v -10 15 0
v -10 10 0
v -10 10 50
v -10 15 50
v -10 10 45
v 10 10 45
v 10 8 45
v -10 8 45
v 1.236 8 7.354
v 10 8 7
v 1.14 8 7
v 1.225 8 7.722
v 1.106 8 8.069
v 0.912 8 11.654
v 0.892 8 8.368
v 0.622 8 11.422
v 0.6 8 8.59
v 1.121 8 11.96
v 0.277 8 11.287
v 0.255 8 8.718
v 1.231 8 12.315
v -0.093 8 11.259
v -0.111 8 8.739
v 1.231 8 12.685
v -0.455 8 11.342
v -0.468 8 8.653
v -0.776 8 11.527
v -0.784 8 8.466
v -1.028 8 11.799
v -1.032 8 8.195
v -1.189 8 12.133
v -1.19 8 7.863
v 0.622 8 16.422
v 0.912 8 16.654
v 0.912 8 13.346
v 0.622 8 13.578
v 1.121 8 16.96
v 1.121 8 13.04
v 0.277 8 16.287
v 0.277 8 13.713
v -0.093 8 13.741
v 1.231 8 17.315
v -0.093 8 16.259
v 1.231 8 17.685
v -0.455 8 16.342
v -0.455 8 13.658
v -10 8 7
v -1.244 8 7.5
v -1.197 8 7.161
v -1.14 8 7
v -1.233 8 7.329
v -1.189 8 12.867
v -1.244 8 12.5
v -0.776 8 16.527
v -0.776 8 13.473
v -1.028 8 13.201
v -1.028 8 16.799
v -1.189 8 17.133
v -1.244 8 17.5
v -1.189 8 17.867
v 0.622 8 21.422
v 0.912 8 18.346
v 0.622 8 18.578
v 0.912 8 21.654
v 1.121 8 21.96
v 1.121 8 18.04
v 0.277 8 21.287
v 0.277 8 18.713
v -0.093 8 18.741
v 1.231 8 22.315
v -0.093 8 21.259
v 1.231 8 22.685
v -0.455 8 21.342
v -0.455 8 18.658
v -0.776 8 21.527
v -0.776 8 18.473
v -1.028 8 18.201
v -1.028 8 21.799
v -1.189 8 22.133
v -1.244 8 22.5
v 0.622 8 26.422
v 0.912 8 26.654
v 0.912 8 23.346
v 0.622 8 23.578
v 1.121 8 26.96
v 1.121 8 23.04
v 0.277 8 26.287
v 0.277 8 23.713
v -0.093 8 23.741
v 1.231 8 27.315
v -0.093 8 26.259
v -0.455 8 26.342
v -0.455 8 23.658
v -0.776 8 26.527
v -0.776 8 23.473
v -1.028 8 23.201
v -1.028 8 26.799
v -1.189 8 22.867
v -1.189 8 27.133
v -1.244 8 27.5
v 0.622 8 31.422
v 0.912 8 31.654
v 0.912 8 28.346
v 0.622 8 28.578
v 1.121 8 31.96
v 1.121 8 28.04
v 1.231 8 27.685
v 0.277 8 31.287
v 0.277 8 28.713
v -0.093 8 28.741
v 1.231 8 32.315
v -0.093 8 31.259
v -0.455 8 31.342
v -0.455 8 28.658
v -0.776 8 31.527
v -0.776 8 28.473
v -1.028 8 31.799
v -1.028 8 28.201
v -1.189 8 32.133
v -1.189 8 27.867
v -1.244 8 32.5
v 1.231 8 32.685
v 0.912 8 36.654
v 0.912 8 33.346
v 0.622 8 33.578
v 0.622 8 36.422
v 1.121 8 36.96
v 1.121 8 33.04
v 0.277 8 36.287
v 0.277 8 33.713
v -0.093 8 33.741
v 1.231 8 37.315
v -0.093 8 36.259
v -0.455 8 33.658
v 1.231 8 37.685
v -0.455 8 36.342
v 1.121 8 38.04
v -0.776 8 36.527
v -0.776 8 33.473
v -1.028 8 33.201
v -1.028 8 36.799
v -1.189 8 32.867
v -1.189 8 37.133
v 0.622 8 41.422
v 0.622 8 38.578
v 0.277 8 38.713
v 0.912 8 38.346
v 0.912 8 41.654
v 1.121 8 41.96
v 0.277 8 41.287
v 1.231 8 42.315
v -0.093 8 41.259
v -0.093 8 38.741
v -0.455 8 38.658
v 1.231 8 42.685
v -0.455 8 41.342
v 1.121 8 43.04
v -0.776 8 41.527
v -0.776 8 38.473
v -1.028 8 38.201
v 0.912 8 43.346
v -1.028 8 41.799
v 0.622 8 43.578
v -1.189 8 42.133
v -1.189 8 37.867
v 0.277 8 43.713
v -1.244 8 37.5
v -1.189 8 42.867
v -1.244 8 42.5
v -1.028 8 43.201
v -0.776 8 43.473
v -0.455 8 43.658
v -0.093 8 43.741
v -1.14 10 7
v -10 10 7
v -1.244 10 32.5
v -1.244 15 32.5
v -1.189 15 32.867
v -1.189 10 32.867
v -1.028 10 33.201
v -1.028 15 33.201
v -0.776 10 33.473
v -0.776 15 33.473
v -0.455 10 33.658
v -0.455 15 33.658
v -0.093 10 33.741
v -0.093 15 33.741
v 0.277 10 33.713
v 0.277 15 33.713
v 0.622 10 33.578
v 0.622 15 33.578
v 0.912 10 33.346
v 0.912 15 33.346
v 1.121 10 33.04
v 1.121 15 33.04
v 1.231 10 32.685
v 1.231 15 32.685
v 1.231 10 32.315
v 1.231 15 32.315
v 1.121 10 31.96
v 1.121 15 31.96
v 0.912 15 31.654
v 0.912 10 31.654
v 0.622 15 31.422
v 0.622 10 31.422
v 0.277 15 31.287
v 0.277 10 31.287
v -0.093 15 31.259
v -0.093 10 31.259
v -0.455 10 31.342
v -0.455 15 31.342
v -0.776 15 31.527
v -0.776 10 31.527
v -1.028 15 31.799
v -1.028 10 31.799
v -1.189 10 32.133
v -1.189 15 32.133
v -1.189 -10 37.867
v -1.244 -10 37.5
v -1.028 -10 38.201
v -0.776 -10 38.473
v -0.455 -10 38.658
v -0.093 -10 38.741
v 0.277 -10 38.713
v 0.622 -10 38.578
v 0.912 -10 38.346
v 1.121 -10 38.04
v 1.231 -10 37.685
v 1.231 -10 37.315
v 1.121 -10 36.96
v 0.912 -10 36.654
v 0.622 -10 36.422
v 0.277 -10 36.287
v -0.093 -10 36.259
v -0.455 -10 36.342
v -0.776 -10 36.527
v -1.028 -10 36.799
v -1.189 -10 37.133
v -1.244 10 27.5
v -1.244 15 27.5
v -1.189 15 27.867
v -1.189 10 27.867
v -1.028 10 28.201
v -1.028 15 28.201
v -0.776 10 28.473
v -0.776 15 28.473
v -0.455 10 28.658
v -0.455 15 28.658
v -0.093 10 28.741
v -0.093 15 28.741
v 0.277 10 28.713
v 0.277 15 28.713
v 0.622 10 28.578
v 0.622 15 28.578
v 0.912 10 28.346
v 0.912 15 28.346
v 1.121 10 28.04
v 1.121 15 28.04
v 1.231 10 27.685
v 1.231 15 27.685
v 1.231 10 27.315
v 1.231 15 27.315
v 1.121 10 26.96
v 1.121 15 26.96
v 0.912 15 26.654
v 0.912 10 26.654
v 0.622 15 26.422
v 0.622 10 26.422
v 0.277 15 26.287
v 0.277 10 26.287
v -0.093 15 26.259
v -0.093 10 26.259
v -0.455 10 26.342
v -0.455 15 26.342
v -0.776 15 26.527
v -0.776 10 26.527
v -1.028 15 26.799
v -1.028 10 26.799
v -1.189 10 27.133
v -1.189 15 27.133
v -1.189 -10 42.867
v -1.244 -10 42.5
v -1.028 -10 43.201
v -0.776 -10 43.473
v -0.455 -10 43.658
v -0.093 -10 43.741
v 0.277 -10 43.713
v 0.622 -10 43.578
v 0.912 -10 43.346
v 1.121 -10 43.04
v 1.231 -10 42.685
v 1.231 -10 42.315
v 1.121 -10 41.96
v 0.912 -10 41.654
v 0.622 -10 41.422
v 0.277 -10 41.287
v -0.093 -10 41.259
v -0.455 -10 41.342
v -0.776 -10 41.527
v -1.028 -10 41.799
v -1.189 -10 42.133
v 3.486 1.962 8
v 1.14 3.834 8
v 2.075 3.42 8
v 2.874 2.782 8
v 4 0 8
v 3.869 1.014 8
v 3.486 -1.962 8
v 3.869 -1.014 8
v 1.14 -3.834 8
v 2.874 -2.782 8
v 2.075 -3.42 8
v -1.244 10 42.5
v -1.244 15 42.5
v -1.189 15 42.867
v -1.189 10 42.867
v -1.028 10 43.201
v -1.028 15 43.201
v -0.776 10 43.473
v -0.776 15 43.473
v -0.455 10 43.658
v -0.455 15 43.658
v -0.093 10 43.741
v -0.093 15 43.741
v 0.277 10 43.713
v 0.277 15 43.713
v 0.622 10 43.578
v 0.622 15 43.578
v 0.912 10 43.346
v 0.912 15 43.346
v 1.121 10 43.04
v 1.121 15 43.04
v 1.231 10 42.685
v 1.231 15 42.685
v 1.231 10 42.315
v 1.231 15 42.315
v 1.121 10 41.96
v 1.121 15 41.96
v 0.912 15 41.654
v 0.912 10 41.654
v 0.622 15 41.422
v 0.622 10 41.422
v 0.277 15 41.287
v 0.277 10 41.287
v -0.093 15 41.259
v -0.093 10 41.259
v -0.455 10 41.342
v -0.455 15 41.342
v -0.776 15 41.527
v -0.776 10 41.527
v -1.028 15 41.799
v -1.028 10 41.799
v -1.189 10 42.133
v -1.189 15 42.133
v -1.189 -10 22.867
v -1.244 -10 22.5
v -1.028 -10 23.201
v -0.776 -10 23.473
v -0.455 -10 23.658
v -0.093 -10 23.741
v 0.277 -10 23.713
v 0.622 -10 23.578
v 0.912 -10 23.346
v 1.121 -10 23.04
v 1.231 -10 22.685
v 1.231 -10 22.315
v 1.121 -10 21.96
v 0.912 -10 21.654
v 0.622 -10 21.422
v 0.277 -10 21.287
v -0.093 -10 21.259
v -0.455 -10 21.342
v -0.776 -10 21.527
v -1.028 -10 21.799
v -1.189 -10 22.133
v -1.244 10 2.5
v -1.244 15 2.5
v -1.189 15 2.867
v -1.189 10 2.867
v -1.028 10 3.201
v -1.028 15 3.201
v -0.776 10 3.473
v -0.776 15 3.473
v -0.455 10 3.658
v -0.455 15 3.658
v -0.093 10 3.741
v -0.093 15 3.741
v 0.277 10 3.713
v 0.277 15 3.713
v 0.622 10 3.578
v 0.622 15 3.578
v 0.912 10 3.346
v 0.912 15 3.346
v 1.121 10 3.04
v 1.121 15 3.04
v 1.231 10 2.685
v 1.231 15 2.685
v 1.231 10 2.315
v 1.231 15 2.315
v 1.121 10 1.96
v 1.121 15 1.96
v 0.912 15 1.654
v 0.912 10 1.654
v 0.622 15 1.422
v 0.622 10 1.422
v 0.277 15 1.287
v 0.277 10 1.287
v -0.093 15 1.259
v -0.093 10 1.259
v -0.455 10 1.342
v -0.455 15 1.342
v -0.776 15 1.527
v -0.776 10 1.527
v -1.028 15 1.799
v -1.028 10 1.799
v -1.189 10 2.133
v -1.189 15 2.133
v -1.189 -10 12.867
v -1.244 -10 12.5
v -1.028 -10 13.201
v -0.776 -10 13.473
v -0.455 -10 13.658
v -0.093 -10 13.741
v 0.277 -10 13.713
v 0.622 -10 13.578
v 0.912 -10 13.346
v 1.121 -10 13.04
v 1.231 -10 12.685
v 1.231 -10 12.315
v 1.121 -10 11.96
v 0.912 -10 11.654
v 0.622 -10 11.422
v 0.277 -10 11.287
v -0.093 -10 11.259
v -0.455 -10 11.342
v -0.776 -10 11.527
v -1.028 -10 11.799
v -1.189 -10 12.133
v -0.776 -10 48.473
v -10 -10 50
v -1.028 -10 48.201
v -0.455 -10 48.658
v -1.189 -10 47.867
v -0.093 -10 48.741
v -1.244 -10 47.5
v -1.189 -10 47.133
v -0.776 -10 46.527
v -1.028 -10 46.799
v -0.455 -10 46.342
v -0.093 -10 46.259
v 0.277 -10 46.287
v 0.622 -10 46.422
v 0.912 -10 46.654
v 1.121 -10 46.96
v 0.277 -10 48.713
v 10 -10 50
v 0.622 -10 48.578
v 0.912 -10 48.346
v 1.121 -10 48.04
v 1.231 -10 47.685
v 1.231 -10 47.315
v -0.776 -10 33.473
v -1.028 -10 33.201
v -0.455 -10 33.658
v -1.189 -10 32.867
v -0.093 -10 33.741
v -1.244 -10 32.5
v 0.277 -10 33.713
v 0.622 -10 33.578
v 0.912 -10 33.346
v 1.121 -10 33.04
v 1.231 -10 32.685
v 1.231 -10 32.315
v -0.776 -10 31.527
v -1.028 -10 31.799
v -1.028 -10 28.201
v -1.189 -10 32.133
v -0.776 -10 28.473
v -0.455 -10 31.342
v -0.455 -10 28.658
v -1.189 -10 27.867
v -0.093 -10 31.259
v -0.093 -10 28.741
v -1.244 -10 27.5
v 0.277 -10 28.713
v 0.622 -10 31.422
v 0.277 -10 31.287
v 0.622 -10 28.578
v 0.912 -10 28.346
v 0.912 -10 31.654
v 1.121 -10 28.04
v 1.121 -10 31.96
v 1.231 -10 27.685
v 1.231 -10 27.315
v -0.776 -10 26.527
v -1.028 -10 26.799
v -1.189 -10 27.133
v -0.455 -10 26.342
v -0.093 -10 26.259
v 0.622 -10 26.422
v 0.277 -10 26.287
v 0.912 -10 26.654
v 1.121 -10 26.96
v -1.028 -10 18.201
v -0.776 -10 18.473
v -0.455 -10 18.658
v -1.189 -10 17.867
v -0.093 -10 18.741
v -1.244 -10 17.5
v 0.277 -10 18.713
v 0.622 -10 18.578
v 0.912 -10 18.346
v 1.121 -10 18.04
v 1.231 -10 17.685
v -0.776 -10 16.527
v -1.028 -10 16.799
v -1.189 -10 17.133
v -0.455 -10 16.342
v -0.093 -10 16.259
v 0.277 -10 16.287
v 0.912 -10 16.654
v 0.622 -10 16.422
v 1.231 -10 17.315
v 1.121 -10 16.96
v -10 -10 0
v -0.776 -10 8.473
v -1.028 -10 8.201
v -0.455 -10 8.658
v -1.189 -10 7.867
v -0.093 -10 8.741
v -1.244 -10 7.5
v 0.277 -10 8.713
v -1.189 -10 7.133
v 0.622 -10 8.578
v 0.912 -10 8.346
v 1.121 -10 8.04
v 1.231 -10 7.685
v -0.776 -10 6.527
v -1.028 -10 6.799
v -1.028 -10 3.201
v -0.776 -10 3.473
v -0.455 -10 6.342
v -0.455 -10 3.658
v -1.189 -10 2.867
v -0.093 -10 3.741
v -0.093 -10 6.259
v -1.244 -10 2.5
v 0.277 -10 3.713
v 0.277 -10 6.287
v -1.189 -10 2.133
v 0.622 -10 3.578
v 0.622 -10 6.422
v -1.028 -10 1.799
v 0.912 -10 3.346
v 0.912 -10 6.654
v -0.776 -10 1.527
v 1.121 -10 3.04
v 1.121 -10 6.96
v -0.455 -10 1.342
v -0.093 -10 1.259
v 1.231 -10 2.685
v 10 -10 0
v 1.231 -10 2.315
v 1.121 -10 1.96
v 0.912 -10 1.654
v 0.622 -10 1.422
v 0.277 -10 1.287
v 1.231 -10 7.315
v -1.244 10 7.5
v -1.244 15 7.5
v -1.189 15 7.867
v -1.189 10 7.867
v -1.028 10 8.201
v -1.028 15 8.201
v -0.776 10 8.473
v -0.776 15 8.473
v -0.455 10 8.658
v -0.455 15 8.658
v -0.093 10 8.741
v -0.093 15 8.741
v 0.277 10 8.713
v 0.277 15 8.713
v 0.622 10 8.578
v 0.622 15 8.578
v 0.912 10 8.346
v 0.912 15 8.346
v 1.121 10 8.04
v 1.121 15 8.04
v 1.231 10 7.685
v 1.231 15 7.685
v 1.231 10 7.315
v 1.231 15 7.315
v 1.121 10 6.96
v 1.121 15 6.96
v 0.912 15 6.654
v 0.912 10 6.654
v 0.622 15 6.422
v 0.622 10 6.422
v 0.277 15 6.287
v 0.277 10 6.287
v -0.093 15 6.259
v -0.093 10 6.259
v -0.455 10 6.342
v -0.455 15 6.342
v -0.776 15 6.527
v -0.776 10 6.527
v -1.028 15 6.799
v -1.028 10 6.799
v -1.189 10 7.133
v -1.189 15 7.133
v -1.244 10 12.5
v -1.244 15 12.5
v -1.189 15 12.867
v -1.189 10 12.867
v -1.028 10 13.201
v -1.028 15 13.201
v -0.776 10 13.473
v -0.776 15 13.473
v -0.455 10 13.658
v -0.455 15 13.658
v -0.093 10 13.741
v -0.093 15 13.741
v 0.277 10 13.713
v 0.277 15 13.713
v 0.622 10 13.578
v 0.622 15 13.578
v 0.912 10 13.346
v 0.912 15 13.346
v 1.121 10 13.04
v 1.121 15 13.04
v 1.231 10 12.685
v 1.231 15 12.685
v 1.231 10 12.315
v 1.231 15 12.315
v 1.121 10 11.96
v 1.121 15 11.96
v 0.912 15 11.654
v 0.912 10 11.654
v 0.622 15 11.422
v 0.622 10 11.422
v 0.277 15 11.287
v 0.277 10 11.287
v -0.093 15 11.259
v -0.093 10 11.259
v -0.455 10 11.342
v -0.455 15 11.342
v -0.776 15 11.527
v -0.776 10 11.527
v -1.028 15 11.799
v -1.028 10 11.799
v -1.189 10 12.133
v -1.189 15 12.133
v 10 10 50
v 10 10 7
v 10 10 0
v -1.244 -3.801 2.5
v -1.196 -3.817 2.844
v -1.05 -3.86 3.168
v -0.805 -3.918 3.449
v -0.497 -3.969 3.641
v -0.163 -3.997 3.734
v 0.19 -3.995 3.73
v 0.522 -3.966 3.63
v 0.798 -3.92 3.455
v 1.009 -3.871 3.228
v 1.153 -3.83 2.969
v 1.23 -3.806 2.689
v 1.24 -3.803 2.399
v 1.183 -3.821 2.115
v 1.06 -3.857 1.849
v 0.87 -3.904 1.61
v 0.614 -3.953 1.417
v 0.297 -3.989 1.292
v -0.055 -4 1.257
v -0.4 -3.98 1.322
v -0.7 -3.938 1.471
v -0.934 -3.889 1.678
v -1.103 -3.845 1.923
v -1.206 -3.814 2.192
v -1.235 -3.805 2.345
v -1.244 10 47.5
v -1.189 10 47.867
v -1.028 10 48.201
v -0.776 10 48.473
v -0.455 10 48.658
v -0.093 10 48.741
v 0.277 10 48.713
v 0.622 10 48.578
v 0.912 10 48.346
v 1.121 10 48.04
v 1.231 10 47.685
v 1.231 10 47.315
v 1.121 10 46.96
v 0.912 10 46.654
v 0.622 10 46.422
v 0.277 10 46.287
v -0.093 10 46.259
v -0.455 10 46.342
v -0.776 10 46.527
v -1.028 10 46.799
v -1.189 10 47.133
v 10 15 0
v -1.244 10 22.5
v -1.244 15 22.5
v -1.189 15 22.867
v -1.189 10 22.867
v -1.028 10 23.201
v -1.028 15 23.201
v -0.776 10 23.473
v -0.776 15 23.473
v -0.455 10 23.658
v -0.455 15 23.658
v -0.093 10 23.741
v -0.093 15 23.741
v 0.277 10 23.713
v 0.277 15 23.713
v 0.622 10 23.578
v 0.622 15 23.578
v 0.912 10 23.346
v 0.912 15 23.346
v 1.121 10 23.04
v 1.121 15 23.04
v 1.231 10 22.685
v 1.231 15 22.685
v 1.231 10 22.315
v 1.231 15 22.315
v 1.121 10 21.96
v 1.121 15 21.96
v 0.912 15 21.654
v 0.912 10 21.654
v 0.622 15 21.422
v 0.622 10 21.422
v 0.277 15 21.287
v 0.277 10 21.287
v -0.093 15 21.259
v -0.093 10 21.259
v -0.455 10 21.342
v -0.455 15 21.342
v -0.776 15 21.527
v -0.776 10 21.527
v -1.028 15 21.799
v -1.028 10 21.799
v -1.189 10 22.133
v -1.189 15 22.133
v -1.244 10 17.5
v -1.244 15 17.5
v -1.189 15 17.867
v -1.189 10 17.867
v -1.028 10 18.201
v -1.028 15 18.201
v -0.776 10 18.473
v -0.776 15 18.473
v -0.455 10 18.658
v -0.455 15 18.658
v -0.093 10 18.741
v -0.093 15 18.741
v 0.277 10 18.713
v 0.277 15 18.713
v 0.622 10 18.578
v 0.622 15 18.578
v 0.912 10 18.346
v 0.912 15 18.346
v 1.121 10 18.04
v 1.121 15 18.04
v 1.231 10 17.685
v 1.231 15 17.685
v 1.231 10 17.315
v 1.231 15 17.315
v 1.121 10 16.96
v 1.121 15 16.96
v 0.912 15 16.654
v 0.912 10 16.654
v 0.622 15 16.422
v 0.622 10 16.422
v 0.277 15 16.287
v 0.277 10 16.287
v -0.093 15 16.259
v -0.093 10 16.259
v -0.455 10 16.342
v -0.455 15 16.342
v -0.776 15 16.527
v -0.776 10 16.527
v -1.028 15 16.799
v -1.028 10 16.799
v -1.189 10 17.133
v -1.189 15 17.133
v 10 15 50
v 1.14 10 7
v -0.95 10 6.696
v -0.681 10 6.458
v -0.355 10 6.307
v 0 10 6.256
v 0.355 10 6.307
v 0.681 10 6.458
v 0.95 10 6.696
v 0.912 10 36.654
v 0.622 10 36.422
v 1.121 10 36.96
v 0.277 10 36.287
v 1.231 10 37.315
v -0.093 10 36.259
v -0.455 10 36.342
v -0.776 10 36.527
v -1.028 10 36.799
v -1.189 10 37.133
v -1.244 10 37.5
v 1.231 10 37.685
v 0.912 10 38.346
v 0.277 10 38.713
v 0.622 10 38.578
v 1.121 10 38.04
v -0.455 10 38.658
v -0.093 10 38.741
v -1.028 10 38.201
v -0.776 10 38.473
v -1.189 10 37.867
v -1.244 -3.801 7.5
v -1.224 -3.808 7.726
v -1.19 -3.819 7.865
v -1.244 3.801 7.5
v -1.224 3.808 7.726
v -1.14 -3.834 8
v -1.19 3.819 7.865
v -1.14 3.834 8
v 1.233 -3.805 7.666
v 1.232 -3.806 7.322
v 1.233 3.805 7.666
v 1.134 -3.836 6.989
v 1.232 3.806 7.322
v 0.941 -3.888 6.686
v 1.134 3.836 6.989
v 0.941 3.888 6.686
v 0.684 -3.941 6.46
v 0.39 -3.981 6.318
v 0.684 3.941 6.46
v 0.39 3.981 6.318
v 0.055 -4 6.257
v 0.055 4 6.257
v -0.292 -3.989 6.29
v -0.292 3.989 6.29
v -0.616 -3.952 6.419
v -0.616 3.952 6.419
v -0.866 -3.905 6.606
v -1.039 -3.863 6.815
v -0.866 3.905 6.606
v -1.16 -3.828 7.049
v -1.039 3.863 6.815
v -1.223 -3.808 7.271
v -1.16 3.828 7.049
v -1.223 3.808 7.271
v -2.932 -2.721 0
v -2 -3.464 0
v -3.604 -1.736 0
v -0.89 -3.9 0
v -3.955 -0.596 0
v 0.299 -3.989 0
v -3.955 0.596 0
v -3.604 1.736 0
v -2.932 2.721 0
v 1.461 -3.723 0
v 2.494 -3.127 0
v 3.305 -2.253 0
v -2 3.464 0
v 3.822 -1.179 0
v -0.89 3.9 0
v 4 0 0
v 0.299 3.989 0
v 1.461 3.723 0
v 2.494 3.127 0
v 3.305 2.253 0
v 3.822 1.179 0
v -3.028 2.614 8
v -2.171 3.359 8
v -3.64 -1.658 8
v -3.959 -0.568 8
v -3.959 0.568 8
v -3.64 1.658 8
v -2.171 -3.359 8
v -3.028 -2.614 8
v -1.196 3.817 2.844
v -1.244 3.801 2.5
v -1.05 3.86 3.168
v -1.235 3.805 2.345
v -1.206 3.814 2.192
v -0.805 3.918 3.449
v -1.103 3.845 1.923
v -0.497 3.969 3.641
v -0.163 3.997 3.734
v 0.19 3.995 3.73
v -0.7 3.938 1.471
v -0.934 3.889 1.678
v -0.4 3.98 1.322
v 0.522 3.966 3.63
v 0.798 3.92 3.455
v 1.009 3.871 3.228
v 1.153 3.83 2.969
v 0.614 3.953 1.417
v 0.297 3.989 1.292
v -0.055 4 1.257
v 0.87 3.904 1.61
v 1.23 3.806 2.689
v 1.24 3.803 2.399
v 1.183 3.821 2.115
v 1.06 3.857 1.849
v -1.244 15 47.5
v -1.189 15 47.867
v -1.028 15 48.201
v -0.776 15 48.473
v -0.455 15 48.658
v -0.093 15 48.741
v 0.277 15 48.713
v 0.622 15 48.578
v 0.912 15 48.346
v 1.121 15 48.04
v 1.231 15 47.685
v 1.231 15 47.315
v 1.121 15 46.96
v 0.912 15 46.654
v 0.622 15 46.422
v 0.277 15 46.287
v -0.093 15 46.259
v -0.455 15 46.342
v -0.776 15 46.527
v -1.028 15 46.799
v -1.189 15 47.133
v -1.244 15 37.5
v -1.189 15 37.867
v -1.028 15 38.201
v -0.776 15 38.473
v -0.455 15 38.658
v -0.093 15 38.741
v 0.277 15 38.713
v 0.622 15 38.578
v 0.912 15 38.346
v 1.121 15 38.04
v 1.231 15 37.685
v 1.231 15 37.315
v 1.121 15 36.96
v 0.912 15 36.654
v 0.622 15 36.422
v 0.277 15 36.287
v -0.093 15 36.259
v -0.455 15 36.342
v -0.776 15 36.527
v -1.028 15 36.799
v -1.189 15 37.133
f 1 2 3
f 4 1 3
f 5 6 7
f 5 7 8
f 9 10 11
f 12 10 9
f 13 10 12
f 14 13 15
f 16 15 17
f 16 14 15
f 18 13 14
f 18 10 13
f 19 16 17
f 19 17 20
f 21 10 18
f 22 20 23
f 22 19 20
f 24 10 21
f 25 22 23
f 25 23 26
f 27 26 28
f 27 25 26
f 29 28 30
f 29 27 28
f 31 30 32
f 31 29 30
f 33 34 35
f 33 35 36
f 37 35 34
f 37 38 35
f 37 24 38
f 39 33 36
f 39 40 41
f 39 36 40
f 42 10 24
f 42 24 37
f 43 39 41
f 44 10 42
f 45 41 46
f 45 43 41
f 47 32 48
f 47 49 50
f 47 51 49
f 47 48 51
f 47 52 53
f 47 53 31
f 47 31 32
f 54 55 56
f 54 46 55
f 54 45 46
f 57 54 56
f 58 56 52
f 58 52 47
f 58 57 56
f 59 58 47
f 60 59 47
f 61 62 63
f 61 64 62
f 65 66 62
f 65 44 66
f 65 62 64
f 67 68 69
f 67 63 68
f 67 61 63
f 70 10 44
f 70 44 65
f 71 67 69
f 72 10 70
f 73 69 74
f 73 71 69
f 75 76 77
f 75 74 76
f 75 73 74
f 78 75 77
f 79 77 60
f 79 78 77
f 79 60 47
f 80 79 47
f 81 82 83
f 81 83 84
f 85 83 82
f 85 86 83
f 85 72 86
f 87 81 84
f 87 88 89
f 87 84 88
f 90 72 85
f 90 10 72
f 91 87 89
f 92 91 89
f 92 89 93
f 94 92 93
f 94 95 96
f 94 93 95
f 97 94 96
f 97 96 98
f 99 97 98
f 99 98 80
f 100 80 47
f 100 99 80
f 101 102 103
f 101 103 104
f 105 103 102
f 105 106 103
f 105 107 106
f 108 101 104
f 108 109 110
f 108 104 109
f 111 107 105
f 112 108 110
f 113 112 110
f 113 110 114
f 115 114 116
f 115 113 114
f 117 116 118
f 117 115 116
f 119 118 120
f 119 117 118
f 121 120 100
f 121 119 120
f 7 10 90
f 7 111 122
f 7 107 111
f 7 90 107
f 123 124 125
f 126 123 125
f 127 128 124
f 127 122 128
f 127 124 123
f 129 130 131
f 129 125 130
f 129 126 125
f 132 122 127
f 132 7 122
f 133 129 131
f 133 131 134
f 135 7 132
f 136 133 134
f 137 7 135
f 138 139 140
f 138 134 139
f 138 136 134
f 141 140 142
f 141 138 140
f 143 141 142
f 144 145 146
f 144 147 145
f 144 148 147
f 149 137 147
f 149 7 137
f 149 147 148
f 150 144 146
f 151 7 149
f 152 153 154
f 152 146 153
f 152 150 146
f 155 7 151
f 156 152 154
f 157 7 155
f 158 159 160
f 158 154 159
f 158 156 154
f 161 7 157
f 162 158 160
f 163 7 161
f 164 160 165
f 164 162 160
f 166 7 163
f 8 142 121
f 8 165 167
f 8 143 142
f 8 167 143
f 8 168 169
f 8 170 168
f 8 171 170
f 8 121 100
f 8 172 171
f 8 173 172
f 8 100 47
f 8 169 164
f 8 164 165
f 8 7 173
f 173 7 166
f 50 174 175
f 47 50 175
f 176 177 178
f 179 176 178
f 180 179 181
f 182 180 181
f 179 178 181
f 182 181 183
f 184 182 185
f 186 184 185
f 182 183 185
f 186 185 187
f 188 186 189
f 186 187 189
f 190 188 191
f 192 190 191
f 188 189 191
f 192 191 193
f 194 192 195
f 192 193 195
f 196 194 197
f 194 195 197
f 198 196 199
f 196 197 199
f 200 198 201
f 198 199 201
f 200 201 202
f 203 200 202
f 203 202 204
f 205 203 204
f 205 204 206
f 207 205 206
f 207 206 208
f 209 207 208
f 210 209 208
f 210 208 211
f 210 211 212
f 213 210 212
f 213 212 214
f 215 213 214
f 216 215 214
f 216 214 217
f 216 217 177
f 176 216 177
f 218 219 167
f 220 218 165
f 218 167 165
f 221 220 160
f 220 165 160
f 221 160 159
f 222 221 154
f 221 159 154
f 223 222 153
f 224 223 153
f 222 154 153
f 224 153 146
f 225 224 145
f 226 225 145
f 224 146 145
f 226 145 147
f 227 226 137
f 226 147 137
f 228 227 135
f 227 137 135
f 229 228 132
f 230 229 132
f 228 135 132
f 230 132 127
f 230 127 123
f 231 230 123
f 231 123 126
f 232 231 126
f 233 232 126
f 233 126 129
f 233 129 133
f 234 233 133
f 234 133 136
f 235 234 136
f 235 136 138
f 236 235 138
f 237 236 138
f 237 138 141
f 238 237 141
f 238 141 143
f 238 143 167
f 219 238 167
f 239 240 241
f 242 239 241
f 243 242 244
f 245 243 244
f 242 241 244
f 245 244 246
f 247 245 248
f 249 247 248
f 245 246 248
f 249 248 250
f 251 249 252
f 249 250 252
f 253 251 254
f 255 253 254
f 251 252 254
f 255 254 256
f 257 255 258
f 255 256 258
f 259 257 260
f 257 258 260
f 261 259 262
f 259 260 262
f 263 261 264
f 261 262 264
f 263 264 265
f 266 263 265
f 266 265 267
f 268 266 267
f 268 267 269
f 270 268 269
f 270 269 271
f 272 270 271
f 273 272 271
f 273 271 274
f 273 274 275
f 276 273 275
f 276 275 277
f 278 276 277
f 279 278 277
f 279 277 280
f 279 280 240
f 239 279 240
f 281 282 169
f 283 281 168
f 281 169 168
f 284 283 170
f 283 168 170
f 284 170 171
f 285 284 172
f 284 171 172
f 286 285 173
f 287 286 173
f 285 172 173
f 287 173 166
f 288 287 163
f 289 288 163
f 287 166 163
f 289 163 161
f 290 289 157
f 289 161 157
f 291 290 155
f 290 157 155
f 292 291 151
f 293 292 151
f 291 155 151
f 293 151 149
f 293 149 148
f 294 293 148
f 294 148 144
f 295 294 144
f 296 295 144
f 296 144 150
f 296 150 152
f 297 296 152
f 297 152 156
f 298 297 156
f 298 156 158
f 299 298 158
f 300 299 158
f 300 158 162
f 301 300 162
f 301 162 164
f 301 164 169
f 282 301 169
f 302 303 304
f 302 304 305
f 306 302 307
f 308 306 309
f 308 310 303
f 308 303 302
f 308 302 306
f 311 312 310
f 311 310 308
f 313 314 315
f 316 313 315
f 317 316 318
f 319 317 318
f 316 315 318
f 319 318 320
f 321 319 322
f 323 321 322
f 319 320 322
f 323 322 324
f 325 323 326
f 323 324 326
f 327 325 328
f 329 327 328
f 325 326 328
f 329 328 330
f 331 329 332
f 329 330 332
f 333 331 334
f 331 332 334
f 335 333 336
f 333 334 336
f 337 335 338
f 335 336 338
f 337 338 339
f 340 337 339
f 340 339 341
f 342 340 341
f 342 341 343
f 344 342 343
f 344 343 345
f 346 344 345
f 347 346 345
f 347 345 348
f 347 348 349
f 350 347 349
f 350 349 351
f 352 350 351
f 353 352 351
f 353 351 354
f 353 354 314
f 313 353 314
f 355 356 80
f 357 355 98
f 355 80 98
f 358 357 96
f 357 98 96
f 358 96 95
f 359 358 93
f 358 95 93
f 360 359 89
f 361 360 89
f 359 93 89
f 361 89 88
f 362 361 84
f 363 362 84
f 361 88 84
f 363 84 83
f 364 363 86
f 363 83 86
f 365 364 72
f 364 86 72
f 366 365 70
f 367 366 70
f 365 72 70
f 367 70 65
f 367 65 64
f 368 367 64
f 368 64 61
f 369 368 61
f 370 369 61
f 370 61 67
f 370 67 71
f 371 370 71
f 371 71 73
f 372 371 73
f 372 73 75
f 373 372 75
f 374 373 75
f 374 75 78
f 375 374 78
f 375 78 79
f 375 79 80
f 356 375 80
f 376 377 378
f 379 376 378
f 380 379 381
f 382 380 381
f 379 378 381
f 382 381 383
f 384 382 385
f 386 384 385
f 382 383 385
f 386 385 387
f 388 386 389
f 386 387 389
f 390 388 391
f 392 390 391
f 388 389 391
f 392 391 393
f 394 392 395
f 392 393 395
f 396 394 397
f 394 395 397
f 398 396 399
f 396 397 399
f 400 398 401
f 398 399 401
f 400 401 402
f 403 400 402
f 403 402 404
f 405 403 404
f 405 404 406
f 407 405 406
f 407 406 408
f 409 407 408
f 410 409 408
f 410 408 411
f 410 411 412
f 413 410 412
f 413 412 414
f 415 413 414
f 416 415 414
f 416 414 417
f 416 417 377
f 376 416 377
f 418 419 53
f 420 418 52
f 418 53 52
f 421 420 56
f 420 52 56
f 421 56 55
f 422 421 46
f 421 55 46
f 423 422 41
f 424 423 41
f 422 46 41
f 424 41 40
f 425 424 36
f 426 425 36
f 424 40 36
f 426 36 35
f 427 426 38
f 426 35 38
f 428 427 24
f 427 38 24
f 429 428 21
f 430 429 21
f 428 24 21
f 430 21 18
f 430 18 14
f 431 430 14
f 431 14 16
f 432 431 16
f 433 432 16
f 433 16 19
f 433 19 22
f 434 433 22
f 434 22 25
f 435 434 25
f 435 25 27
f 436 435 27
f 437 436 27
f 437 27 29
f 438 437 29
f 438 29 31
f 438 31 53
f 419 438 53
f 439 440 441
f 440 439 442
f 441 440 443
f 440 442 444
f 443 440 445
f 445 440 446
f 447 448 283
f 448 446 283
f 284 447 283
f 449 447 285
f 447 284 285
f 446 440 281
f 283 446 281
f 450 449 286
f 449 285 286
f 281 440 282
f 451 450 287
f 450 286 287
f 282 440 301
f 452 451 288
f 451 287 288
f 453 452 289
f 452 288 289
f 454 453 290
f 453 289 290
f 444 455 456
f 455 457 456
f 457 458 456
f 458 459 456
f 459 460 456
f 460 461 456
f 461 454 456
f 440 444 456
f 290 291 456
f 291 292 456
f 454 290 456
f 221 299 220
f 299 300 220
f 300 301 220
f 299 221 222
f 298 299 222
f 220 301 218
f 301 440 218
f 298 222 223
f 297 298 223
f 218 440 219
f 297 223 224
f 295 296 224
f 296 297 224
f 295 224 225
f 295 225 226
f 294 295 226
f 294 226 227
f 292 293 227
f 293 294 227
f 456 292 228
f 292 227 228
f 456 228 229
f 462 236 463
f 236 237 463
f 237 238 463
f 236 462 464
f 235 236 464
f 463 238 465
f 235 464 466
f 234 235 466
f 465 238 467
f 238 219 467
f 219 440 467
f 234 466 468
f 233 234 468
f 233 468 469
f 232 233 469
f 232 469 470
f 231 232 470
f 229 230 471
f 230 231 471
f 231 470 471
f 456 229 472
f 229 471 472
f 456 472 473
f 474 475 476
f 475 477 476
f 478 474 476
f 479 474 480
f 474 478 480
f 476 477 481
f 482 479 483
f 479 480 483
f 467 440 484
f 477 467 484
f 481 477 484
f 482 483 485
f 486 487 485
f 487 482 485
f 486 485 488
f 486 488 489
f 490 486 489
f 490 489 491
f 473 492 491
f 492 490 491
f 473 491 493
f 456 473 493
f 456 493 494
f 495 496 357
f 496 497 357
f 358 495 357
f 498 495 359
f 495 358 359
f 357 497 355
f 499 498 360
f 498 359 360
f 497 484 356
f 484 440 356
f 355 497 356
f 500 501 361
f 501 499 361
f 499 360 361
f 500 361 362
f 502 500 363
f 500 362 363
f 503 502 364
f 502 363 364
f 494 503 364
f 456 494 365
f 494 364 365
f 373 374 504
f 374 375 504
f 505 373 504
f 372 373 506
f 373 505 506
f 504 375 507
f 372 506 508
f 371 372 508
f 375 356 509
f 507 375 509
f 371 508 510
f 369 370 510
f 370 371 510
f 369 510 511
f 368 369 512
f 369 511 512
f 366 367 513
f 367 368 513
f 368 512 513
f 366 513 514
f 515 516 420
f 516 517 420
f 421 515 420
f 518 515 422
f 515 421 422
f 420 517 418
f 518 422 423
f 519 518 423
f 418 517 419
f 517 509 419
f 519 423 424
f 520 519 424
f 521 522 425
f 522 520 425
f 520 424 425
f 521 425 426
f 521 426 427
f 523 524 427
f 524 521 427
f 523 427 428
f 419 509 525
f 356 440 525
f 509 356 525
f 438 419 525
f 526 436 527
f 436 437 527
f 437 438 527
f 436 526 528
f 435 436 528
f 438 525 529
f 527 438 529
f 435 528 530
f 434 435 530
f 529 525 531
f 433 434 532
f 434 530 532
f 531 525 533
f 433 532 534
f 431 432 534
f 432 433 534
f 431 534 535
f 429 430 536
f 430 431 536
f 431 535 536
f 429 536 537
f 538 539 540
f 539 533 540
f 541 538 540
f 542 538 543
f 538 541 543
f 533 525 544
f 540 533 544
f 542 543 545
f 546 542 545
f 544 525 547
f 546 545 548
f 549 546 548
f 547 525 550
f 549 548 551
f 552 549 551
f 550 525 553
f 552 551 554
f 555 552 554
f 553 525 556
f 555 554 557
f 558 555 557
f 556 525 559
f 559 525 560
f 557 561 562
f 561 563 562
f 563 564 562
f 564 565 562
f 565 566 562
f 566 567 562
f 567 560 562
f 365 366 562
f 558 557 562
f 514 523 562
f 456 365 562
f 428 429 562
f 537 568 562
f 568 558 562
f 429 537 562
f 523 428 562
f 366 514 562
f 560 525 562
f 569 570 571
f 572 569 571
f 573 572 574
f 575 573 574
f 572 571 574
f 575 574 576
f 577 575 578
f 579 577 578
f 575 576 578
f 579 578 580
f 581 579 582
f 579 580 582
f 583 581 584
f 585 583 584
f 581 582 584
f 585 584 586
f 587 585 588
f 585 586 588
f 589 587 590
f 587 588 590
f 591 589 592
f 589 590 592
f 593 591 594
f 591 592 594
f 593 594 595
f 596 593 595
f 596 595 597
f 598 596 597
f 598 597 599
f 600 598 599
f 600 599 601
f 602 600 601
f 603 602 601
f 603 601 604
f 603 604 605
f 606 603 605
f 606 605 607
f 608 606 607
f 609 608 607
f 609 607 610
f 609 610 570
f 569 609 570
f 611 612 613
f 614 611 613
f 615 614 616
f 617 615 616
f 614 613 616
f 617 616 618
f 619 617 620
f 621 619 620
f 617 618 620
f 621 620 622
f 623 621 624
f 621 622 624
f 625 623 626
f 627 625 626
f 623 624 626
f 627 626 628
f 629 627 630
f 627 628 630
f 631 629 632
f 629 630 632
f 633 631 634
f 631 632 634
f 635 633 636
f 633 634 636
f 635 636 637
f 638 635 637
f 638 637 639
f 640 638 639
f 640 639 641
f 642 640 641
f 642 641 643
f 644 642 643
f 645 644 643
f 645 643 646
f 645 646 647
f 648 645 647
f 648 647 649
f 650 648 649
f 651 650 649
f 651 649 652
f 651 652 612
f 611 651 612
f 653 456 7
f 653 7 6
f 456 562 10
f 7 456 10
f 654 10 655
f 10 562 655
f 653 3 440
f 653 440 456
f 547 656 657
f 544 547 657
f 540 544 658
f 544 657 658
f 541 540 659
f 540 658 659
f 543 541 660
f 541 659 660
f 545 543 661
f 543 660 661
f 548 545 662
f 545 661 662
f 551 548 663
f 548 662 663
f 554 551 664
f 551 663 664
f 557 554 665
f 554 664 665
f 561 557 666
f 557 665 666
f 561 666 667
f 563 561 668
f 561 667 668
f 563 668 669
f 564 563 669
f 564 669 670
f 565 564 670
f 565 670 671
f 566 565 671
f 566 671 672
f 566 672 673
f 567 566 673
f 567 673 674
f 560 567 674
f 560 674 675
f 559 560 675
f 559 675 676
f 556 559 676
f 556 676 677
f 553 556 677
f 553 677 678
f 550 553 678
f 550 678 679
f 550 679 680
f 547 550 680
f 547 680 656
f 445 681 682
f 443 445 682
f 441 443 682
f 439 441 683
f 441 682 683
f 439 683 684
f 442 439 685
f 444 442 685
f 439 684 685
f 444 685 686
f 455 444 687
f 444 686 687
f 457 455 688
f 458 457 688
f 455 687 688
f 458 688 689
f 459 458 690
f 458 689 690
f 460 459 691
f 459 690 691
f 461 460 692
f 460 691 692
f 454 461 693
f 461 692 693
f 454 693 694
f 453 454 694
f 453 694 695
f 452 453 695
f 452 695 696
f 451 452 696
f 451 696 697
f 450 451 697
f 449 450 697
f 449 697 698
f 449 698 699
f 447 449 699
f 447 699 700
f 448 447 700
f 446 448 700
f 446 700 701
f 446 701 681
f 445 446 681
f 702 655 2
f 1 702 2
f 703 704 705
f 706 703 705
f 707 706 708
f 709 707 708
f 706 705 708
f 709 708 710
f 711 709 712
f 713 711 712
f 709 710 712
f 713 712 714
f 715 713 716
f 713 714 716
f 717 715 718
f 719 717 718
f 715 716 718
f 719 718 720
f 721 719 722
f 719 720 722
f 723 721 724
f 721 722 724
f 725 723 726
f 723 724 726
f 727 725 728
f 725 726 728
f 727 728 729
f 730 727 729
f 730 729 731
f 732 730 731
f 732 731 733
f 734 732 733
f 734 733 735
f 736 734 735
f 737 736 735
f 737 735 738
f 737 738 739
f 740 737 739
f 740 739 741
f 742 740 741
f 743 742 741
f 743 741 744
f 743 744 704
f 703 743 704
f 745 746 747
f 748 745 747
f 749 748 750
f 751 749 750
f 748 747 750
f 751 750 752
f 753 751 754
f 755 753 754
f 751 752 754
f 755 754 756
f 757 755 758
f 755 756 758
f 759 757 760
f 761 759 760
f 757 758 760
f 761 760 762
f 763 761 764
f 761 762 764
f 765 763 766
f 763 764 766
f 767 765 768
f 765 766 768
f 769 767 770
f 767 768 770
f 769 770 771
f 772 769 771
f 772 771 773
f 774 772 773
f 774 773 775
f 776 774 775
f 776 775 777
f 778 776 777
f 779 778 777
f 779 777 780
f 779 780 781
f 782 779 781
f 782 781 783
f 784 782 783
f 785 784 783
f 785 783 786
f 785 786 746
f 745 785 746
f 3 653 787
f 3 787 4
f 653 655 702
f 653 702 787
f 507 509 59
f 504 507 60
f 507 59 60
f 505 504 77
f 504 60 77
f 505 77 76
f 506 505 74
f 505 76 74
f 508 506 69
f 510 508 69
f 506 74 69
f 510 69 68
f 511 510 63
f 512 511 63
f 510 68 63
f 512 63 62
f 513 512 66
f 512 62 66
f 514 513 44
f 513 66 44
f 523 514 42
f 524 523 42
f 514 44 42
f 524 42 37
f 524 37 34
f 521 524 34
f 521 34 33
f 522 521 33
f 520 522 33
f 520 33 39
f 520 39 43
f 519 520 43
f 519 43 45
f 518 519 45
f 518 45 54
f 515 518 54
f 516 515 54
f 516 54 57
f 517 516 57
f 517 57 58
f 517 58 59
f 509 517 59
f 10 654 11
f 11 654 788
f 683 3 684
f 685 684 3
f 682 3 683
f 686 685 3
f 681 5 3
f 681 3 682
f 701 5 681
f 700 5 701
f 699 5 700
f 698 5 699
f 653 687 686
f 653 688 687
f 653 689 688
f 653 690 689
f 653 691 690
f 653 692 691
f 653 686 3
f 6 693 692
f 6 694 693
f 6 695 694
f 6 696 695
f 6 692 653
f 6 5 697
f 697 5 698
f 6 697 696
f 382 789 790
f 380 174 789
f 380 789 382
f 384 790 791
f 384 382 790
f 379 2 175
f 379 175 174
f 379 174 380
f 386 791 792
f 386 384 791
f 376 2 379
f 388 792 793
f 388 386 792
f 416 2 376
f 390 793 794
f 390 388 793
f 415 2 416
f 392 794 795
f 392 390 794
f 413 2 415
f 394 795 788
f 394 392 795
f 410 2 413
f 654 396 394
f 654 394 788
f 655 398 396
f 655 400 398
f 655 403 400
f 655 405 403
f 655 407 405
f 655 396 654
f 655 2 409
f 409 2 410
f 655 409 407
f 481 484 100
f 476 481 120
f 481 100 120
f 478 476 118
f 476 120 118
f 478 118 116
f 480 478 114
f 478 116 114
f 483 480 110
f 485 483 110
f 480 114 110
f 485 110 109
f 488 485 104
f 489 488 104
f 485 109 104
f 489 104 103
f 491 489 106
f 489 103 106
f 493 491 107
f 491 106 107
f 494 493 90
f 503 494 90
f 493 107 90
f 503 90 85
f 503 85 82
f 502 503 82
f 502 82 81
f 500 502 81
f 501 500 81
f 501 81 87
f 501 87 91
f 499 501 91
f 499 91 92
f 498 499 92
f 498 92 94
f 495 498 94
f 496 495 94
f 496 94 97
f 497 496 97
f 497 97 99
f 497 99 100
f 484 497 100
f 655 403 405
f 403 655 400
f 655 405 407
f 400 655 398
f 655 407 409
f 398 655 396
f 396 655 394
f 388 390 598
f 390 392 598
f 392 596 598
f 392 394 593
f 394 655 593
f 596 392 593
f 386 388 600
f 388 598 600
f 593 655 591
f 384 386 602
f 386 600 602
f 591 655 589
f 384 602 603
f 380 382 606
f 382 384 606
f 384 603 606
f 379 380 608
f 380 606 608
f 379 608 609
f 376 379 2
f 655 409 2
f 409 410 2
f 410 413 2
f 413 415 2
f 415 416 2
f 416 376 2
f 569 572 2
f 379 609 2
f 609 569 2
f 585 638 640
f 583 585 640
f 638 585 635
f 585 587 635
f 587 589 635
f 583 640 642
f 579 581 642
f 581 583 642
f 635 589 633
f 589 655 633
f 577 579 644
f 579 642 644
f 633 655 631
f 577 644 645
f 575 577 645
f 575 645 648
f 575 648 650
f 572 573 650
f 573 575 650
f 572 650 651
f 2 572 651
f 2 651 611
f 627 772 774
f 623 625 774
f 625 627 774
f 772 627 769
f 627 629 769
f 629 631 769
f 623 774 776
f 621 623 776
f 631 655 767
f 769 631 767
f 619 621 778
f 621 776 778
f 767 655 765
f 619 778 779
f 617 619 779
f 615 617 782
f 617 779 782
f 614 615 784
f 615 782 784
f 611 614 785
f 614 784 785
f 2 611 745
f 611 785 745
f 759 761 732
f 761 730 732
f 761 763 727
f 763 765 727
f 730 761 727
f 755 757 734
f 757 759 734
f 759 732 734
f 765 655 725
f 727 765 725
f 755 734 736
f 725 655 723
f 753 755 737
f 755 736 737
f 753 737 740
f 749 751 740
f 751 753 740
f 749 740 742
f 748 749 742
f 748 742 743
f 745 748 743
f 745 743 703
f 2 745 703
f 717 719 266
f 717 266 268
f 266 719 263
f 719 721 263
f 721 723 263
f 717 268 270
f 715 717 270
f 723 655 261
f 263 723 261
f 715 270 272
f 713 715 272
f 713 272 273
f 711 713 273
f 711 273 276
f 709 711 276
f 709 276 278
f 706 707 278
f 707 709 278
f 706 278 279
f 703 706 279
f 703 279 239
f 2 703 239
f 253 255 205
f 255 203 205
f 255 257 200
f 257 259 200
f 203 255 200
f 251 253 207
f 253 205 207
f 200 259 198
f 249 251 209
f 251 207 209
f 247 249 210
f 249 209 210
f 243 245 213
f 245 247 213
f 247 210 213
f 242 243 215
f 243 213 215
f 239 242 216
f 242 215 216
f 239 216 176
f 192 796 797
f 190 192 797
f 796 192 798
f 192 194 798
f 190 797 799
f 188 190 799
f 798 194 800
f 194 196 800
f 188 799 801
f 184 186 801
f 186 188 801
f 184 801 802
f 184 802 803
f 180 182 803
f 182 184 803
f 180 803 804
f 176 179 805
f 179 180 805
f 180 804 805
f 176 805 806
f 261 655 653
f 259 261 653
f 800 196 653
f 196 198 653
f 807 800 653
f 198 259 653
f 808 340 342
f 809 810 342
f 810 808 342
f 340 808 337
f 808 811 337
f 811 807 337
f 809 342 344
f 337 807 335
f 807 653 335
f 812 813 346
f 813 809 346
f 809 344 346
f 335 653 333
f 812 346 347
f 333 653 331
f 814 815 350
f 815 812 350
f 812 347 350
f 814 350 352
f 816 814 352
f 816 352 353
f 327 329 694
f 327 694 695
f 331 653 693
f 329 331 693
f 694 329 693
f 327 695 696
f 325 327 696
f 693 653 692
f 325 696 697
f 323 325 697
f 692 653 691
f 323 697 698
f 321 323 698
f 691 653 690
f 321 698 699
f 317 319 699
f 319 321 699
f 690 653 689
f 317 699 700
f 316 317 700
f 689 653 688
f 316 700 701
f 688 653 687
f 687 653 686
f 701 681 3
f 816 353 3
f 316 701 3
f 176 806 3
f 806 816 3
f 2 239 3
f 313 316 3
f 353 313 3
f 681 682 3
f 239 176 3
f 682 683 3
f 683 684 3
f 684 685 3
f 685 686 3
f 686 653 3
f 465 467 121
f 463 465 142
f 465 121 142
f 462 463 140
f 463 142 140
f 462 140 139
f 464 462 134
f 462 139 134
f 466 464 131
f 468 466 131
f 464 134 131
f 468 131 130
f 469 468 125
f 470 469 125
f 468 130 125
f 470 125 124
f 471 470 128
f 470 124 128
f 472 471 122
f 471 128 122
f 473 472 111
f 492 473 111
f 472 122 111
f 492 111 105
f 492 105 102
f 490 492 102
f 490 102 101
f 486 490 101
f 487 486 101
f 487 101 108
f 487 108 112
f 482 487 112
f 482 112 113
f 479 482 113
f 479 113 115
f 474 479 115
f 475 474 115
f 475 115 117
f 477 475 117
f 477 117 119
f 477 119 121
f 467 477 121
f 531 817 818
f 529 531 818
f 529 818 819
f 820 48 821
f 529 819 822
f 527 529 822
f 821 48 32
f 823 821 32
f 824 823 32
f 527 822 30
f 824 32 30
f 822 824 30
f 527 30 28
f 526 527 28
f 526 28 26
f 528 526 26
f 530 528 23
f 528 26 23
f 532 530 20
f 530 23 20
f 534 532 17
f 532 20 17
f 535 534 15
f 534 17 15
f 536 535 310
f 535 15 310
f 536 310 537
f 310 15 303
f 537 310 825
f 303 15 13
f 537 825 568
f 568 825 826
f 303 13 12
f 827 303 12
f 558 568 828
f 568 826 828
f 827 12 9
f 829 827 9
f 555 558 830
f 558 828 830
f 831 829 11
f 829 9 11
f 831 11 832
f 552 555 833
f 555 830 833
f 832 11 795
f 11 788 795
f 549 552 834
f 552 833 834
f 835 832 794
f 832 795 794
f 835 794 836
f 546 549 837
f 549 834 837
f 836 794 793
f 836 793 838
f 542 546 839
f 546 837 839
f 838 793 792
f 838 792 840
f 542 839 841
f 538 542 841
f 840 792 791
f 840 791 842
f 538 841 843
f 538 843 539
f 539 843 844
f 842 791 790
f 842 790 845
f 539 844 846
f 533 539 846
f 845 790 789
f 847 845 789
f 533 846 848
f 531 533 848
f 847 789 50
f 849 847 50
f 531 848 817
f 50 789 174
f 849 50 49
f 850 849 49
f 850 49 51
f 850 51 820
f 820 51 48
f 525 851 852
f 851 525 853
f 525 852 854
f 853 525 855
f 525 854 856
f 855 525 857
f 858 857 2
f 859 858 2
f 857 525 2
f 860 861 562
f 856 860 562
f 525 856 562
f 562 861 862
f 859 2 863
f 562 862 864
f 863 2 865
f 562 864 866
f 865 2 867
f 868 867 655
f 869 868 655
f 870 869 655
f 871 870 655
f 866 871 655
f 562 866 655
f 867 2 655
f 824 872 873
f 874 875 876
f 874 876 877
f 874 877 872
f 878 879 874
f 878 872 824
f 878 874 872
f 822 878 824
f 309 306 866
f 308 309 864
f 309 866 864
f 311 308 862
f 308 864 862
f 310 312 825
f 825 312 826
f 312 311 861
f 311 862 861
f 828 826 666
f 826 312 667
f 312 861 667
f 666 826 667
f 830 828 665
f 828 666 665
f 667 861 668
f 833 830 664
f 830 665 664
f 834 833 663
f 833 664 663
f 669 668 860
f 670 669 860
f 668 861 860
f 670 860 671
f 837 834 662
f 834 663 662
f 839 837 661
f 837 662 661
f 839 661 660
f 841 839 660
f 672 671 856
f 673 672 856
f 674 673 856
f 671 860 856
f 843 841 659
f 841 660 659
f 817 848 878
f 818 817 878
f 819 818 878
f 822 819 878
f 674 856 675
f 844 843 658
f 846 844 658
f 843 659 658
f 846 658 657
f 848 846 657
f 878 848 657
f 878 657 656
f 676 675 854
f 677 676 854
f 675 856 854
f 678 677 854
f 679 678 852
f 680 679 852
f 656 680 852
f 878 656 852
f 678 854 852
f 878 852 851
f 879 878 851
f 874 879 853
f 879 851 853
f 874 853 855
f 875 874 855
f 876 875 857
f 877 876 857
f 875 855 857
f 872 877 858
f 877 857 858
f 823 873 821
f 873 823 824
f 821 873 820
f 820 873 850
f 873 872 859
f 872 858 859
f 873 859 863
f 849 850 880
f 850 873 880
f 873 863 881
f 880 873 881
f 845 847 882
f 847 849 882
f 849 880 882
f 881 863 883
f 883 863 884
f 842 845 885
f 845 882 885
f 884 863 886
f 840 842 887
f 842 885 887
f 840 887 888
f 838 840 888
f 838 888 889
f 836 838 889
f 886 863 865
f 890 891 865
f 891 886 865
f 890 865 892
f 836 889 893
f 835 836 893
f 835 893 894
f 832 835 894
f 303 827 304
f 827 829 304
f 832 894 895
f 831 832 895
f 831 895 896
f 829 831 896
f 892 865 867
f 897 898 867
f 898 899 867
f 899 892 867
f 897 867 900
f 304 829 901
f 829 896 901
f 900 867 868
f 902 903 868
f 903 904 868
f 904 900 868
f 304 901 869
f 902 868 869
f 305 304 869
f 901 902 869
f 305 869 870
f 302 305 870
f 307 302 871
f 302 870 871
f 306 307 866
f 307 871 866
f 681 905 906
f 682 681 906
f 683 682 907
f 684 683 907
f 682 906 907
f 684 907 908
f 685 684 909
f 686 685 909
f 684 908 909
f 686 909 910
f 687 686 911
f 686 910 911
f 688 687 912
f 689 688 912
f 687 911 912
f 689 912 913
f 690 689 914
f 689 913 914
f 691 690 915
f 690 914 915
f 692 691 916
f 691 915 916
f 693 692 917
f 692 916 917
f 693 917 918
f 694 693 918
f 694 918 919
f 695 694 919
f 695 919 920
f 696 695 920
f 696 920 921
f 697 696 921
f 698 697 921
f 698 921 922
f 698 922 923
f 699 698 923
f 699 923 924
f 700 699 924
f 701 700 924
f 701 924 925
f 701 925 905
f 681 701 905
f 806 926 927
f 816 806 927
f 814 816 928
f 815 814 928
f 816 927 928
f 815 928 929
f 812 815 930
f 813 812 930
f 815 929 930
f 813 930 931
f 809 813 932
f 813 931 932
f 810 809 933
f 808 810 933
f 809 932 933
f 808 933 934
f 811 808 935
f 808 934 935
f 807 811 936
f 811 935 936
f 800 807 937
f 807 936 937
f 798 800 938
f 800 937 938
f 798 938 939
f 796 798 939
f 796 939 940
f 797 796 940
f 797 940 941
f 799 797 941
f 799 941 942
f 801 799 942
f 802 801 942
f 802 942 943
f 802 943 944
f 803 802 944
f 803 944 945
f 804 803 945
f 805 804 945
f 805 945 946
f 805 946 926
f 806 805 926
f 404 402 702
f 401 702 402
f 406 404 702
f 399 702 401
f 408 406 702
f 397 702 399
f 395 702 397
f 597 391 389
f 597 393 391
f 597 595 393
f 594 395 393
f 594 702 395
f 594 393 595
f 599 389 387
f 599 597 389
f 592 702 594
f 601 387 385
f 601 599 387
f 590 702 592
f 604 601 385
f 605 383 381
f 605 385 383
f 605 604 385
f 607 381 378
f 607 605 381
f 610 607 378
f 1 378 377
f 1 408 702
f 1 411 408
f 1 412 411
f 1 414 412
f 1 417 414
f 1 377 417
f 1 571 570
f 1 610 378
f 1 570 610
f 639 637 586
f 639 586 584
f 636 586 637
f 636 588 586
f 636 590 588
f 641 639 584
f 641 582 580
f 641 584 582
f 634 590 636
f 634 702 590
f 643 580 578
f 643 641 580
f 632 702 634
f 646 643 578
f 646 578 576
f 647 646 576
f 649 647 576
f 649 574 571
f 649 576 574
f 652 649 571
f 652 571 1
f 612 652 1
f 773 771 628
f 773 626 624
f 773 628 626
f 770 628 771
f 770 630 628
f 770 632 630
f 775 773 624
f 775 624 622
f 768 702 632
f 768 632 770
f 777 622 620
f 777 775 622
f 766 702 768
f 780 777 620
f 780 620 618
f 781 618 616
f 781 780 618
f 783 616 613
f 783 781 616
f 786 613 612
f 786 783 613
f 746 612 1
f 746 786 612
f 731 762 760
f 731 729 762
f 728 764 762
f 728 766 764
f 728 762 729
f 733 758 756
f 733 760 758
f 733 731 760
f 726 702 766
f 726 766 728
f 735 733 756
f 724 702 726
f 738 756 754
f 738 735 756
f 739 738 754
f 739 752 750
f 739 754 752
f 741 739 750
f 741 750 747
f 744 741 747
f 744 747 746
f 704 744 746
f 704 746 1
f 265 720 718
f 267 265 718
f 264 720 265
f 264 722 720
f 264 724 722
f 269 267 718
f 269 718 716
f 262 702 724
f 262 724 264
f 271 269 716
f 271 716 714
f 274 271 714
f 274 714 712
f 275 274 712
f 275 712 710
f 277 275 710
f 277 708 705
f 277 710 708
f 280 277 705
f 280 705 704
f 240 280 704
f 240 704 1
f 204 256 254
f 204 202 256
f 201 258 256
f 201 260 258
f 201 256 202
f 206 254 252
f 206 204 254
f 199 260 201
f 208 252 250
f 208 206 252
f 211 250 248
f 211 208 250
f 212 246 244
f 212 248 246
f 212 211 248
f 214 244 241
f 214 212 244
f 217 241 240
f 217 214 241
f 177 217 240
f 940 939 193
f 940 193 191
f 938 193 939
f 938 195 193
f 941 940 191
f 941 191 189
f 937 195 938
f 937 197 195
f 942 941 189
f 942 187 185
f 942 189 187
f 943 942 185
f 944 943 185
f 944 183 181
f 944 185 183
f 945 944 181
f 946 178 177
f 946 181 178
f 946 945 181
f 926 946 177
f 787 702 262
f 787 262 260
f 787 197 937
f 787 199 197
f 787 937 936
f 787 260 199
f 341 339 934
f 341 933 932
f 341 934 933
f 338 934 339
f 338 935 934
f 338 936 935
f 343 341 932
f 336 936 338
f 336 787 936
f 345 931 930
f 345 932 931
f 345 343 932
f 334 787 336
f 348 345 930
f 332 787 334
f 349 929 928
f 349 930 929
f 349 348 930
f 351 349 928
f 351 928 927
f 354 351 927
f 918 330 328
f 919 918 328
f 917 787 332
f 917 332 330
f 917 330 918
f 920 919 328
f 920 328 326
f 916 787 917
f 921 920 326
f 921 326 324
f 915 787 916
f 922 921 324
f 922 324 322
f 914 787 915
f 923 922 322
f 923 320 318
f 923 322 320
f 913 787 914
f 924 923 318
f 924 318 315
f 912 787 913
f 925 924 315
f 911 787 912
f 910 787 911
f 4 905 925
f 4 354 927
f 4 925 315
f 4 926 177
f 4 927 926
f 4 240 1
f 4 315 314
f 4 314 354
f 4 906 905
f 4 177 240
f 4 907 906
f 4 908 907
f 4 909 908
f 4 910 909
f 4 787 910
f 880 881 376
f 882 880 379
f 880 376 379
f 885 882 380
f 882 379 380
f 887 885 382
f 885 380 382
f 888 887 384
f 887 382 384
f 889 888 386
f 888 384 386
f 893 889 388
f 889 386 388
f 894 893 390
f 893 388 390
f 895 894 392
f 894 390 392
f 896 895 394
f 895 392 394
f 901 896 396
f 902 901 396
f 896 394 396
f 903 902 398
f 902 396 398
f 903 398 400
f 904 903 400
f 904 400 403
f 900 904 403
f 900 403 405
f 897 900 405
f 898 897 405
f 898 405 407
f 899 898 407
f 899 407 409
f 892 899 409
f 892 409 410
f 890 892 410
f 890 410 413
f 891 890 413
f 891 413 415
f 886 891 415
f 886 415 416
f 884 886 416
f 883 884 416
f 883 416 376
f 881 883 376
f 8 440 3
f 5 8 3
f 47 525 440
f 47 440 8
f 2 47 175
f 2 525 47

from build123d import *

# Parameters (mm, degrees)
F0_W     = 20
F0_H     = 20
F1_DEPTH = 50
F2_W     = 20
F2_H     = 38
F3_DEPTH = 2
F4_R     = 4
F5_DEPTH = 8
F6_W     = 20
F6_H     = 50
F7_DEPTH = 5
F8_R     = 1.244435
F9_DEPTH = 25.001


with BuildPart() as f1:
    # F0 (on Top) → F1 (new body)
    with BuildSketch(Plane.XY):
        Rectangle(F0_W, F0_H)
    extrude(amount=F1_DEPTH)

    # F2 (on face) → F3 (cut)
    with BuildSketch(Plane(origin=(0, 10, 0), x_dir=(-1, 0, 0), z_dir=(0, 1, 0))):
        with Locations((0, 26)):
            Rectangle(F2_W, F2_H)
    extrude(amount=-F3_DEPTH, mode=Mode.SUBTRACT)

    # F4 (on face) → F5 (cut)
    with BuildSketch(Plane(origin=(0, 0, 0), x_dir=(1, 0, 0), z_dir=(0, 0, -1))):
        Circle(F4_R)
    extrude(amount=-F5_DEPTH, mode=Mode.SUBTRACT)


with BuildPart() as f7:
    # F6 (on face) → F7 (new body)
    with BuildSketch(Plane(origin=(0, 10, 0), x_dir=(-1, 0, 0), z_dir=(0, 1, 0))):
        with Locations((0, 25)):
            Rectangle(F6_W, F6_H)
    extrude(amount=F7_DEPTH)


with BuildPart() as f9_tool:
    # F8 (on face) → F9 (new body, through all)
    with BuildSketch(Plane(origin=(0, 15, 0), x_dir=(-1, 0, 0), z_dir=(0, 1, 0))):
        with Locations((0, 47.5)):
            Circle(F8_R)
        with Locations((0, 42.5)):
            Circle(F8_R)
        with Locations((0, 37.5)):
            Circle(F8_R)
        with Locations((0, 32.5)):
            Circle(F8_R)
        with Locations((0, 27.5)):
            Circle(F8_R)
        with Locations((0, 22.5)):
            Circle(F8_R)
        with Locations((0, 17.5)):
            Circle(F8_R)
        with Locations((0, 12.5)):
            Circle(F8_R)
        with Locations((0, 7.5)):
            Circle(F8_R)
        with Locations((0, 2.5)):
            Circle(F8_R)
    extrude(amount=-F9_DEPTH)


with BuildPart() as f1_1:
    add(f1.part)

    # F9: cut by f9_tool
    add(f9_tool.part, mode=Mode.SUBTRACT)


with BuildPart() as f7_1:
    add(f7.part)

    # F9: cut by f9_tool
    add(f9_tool.part, mode=Mode.SUBTRACT)


solid = Compound([f1_1.part, f7_1.part])
